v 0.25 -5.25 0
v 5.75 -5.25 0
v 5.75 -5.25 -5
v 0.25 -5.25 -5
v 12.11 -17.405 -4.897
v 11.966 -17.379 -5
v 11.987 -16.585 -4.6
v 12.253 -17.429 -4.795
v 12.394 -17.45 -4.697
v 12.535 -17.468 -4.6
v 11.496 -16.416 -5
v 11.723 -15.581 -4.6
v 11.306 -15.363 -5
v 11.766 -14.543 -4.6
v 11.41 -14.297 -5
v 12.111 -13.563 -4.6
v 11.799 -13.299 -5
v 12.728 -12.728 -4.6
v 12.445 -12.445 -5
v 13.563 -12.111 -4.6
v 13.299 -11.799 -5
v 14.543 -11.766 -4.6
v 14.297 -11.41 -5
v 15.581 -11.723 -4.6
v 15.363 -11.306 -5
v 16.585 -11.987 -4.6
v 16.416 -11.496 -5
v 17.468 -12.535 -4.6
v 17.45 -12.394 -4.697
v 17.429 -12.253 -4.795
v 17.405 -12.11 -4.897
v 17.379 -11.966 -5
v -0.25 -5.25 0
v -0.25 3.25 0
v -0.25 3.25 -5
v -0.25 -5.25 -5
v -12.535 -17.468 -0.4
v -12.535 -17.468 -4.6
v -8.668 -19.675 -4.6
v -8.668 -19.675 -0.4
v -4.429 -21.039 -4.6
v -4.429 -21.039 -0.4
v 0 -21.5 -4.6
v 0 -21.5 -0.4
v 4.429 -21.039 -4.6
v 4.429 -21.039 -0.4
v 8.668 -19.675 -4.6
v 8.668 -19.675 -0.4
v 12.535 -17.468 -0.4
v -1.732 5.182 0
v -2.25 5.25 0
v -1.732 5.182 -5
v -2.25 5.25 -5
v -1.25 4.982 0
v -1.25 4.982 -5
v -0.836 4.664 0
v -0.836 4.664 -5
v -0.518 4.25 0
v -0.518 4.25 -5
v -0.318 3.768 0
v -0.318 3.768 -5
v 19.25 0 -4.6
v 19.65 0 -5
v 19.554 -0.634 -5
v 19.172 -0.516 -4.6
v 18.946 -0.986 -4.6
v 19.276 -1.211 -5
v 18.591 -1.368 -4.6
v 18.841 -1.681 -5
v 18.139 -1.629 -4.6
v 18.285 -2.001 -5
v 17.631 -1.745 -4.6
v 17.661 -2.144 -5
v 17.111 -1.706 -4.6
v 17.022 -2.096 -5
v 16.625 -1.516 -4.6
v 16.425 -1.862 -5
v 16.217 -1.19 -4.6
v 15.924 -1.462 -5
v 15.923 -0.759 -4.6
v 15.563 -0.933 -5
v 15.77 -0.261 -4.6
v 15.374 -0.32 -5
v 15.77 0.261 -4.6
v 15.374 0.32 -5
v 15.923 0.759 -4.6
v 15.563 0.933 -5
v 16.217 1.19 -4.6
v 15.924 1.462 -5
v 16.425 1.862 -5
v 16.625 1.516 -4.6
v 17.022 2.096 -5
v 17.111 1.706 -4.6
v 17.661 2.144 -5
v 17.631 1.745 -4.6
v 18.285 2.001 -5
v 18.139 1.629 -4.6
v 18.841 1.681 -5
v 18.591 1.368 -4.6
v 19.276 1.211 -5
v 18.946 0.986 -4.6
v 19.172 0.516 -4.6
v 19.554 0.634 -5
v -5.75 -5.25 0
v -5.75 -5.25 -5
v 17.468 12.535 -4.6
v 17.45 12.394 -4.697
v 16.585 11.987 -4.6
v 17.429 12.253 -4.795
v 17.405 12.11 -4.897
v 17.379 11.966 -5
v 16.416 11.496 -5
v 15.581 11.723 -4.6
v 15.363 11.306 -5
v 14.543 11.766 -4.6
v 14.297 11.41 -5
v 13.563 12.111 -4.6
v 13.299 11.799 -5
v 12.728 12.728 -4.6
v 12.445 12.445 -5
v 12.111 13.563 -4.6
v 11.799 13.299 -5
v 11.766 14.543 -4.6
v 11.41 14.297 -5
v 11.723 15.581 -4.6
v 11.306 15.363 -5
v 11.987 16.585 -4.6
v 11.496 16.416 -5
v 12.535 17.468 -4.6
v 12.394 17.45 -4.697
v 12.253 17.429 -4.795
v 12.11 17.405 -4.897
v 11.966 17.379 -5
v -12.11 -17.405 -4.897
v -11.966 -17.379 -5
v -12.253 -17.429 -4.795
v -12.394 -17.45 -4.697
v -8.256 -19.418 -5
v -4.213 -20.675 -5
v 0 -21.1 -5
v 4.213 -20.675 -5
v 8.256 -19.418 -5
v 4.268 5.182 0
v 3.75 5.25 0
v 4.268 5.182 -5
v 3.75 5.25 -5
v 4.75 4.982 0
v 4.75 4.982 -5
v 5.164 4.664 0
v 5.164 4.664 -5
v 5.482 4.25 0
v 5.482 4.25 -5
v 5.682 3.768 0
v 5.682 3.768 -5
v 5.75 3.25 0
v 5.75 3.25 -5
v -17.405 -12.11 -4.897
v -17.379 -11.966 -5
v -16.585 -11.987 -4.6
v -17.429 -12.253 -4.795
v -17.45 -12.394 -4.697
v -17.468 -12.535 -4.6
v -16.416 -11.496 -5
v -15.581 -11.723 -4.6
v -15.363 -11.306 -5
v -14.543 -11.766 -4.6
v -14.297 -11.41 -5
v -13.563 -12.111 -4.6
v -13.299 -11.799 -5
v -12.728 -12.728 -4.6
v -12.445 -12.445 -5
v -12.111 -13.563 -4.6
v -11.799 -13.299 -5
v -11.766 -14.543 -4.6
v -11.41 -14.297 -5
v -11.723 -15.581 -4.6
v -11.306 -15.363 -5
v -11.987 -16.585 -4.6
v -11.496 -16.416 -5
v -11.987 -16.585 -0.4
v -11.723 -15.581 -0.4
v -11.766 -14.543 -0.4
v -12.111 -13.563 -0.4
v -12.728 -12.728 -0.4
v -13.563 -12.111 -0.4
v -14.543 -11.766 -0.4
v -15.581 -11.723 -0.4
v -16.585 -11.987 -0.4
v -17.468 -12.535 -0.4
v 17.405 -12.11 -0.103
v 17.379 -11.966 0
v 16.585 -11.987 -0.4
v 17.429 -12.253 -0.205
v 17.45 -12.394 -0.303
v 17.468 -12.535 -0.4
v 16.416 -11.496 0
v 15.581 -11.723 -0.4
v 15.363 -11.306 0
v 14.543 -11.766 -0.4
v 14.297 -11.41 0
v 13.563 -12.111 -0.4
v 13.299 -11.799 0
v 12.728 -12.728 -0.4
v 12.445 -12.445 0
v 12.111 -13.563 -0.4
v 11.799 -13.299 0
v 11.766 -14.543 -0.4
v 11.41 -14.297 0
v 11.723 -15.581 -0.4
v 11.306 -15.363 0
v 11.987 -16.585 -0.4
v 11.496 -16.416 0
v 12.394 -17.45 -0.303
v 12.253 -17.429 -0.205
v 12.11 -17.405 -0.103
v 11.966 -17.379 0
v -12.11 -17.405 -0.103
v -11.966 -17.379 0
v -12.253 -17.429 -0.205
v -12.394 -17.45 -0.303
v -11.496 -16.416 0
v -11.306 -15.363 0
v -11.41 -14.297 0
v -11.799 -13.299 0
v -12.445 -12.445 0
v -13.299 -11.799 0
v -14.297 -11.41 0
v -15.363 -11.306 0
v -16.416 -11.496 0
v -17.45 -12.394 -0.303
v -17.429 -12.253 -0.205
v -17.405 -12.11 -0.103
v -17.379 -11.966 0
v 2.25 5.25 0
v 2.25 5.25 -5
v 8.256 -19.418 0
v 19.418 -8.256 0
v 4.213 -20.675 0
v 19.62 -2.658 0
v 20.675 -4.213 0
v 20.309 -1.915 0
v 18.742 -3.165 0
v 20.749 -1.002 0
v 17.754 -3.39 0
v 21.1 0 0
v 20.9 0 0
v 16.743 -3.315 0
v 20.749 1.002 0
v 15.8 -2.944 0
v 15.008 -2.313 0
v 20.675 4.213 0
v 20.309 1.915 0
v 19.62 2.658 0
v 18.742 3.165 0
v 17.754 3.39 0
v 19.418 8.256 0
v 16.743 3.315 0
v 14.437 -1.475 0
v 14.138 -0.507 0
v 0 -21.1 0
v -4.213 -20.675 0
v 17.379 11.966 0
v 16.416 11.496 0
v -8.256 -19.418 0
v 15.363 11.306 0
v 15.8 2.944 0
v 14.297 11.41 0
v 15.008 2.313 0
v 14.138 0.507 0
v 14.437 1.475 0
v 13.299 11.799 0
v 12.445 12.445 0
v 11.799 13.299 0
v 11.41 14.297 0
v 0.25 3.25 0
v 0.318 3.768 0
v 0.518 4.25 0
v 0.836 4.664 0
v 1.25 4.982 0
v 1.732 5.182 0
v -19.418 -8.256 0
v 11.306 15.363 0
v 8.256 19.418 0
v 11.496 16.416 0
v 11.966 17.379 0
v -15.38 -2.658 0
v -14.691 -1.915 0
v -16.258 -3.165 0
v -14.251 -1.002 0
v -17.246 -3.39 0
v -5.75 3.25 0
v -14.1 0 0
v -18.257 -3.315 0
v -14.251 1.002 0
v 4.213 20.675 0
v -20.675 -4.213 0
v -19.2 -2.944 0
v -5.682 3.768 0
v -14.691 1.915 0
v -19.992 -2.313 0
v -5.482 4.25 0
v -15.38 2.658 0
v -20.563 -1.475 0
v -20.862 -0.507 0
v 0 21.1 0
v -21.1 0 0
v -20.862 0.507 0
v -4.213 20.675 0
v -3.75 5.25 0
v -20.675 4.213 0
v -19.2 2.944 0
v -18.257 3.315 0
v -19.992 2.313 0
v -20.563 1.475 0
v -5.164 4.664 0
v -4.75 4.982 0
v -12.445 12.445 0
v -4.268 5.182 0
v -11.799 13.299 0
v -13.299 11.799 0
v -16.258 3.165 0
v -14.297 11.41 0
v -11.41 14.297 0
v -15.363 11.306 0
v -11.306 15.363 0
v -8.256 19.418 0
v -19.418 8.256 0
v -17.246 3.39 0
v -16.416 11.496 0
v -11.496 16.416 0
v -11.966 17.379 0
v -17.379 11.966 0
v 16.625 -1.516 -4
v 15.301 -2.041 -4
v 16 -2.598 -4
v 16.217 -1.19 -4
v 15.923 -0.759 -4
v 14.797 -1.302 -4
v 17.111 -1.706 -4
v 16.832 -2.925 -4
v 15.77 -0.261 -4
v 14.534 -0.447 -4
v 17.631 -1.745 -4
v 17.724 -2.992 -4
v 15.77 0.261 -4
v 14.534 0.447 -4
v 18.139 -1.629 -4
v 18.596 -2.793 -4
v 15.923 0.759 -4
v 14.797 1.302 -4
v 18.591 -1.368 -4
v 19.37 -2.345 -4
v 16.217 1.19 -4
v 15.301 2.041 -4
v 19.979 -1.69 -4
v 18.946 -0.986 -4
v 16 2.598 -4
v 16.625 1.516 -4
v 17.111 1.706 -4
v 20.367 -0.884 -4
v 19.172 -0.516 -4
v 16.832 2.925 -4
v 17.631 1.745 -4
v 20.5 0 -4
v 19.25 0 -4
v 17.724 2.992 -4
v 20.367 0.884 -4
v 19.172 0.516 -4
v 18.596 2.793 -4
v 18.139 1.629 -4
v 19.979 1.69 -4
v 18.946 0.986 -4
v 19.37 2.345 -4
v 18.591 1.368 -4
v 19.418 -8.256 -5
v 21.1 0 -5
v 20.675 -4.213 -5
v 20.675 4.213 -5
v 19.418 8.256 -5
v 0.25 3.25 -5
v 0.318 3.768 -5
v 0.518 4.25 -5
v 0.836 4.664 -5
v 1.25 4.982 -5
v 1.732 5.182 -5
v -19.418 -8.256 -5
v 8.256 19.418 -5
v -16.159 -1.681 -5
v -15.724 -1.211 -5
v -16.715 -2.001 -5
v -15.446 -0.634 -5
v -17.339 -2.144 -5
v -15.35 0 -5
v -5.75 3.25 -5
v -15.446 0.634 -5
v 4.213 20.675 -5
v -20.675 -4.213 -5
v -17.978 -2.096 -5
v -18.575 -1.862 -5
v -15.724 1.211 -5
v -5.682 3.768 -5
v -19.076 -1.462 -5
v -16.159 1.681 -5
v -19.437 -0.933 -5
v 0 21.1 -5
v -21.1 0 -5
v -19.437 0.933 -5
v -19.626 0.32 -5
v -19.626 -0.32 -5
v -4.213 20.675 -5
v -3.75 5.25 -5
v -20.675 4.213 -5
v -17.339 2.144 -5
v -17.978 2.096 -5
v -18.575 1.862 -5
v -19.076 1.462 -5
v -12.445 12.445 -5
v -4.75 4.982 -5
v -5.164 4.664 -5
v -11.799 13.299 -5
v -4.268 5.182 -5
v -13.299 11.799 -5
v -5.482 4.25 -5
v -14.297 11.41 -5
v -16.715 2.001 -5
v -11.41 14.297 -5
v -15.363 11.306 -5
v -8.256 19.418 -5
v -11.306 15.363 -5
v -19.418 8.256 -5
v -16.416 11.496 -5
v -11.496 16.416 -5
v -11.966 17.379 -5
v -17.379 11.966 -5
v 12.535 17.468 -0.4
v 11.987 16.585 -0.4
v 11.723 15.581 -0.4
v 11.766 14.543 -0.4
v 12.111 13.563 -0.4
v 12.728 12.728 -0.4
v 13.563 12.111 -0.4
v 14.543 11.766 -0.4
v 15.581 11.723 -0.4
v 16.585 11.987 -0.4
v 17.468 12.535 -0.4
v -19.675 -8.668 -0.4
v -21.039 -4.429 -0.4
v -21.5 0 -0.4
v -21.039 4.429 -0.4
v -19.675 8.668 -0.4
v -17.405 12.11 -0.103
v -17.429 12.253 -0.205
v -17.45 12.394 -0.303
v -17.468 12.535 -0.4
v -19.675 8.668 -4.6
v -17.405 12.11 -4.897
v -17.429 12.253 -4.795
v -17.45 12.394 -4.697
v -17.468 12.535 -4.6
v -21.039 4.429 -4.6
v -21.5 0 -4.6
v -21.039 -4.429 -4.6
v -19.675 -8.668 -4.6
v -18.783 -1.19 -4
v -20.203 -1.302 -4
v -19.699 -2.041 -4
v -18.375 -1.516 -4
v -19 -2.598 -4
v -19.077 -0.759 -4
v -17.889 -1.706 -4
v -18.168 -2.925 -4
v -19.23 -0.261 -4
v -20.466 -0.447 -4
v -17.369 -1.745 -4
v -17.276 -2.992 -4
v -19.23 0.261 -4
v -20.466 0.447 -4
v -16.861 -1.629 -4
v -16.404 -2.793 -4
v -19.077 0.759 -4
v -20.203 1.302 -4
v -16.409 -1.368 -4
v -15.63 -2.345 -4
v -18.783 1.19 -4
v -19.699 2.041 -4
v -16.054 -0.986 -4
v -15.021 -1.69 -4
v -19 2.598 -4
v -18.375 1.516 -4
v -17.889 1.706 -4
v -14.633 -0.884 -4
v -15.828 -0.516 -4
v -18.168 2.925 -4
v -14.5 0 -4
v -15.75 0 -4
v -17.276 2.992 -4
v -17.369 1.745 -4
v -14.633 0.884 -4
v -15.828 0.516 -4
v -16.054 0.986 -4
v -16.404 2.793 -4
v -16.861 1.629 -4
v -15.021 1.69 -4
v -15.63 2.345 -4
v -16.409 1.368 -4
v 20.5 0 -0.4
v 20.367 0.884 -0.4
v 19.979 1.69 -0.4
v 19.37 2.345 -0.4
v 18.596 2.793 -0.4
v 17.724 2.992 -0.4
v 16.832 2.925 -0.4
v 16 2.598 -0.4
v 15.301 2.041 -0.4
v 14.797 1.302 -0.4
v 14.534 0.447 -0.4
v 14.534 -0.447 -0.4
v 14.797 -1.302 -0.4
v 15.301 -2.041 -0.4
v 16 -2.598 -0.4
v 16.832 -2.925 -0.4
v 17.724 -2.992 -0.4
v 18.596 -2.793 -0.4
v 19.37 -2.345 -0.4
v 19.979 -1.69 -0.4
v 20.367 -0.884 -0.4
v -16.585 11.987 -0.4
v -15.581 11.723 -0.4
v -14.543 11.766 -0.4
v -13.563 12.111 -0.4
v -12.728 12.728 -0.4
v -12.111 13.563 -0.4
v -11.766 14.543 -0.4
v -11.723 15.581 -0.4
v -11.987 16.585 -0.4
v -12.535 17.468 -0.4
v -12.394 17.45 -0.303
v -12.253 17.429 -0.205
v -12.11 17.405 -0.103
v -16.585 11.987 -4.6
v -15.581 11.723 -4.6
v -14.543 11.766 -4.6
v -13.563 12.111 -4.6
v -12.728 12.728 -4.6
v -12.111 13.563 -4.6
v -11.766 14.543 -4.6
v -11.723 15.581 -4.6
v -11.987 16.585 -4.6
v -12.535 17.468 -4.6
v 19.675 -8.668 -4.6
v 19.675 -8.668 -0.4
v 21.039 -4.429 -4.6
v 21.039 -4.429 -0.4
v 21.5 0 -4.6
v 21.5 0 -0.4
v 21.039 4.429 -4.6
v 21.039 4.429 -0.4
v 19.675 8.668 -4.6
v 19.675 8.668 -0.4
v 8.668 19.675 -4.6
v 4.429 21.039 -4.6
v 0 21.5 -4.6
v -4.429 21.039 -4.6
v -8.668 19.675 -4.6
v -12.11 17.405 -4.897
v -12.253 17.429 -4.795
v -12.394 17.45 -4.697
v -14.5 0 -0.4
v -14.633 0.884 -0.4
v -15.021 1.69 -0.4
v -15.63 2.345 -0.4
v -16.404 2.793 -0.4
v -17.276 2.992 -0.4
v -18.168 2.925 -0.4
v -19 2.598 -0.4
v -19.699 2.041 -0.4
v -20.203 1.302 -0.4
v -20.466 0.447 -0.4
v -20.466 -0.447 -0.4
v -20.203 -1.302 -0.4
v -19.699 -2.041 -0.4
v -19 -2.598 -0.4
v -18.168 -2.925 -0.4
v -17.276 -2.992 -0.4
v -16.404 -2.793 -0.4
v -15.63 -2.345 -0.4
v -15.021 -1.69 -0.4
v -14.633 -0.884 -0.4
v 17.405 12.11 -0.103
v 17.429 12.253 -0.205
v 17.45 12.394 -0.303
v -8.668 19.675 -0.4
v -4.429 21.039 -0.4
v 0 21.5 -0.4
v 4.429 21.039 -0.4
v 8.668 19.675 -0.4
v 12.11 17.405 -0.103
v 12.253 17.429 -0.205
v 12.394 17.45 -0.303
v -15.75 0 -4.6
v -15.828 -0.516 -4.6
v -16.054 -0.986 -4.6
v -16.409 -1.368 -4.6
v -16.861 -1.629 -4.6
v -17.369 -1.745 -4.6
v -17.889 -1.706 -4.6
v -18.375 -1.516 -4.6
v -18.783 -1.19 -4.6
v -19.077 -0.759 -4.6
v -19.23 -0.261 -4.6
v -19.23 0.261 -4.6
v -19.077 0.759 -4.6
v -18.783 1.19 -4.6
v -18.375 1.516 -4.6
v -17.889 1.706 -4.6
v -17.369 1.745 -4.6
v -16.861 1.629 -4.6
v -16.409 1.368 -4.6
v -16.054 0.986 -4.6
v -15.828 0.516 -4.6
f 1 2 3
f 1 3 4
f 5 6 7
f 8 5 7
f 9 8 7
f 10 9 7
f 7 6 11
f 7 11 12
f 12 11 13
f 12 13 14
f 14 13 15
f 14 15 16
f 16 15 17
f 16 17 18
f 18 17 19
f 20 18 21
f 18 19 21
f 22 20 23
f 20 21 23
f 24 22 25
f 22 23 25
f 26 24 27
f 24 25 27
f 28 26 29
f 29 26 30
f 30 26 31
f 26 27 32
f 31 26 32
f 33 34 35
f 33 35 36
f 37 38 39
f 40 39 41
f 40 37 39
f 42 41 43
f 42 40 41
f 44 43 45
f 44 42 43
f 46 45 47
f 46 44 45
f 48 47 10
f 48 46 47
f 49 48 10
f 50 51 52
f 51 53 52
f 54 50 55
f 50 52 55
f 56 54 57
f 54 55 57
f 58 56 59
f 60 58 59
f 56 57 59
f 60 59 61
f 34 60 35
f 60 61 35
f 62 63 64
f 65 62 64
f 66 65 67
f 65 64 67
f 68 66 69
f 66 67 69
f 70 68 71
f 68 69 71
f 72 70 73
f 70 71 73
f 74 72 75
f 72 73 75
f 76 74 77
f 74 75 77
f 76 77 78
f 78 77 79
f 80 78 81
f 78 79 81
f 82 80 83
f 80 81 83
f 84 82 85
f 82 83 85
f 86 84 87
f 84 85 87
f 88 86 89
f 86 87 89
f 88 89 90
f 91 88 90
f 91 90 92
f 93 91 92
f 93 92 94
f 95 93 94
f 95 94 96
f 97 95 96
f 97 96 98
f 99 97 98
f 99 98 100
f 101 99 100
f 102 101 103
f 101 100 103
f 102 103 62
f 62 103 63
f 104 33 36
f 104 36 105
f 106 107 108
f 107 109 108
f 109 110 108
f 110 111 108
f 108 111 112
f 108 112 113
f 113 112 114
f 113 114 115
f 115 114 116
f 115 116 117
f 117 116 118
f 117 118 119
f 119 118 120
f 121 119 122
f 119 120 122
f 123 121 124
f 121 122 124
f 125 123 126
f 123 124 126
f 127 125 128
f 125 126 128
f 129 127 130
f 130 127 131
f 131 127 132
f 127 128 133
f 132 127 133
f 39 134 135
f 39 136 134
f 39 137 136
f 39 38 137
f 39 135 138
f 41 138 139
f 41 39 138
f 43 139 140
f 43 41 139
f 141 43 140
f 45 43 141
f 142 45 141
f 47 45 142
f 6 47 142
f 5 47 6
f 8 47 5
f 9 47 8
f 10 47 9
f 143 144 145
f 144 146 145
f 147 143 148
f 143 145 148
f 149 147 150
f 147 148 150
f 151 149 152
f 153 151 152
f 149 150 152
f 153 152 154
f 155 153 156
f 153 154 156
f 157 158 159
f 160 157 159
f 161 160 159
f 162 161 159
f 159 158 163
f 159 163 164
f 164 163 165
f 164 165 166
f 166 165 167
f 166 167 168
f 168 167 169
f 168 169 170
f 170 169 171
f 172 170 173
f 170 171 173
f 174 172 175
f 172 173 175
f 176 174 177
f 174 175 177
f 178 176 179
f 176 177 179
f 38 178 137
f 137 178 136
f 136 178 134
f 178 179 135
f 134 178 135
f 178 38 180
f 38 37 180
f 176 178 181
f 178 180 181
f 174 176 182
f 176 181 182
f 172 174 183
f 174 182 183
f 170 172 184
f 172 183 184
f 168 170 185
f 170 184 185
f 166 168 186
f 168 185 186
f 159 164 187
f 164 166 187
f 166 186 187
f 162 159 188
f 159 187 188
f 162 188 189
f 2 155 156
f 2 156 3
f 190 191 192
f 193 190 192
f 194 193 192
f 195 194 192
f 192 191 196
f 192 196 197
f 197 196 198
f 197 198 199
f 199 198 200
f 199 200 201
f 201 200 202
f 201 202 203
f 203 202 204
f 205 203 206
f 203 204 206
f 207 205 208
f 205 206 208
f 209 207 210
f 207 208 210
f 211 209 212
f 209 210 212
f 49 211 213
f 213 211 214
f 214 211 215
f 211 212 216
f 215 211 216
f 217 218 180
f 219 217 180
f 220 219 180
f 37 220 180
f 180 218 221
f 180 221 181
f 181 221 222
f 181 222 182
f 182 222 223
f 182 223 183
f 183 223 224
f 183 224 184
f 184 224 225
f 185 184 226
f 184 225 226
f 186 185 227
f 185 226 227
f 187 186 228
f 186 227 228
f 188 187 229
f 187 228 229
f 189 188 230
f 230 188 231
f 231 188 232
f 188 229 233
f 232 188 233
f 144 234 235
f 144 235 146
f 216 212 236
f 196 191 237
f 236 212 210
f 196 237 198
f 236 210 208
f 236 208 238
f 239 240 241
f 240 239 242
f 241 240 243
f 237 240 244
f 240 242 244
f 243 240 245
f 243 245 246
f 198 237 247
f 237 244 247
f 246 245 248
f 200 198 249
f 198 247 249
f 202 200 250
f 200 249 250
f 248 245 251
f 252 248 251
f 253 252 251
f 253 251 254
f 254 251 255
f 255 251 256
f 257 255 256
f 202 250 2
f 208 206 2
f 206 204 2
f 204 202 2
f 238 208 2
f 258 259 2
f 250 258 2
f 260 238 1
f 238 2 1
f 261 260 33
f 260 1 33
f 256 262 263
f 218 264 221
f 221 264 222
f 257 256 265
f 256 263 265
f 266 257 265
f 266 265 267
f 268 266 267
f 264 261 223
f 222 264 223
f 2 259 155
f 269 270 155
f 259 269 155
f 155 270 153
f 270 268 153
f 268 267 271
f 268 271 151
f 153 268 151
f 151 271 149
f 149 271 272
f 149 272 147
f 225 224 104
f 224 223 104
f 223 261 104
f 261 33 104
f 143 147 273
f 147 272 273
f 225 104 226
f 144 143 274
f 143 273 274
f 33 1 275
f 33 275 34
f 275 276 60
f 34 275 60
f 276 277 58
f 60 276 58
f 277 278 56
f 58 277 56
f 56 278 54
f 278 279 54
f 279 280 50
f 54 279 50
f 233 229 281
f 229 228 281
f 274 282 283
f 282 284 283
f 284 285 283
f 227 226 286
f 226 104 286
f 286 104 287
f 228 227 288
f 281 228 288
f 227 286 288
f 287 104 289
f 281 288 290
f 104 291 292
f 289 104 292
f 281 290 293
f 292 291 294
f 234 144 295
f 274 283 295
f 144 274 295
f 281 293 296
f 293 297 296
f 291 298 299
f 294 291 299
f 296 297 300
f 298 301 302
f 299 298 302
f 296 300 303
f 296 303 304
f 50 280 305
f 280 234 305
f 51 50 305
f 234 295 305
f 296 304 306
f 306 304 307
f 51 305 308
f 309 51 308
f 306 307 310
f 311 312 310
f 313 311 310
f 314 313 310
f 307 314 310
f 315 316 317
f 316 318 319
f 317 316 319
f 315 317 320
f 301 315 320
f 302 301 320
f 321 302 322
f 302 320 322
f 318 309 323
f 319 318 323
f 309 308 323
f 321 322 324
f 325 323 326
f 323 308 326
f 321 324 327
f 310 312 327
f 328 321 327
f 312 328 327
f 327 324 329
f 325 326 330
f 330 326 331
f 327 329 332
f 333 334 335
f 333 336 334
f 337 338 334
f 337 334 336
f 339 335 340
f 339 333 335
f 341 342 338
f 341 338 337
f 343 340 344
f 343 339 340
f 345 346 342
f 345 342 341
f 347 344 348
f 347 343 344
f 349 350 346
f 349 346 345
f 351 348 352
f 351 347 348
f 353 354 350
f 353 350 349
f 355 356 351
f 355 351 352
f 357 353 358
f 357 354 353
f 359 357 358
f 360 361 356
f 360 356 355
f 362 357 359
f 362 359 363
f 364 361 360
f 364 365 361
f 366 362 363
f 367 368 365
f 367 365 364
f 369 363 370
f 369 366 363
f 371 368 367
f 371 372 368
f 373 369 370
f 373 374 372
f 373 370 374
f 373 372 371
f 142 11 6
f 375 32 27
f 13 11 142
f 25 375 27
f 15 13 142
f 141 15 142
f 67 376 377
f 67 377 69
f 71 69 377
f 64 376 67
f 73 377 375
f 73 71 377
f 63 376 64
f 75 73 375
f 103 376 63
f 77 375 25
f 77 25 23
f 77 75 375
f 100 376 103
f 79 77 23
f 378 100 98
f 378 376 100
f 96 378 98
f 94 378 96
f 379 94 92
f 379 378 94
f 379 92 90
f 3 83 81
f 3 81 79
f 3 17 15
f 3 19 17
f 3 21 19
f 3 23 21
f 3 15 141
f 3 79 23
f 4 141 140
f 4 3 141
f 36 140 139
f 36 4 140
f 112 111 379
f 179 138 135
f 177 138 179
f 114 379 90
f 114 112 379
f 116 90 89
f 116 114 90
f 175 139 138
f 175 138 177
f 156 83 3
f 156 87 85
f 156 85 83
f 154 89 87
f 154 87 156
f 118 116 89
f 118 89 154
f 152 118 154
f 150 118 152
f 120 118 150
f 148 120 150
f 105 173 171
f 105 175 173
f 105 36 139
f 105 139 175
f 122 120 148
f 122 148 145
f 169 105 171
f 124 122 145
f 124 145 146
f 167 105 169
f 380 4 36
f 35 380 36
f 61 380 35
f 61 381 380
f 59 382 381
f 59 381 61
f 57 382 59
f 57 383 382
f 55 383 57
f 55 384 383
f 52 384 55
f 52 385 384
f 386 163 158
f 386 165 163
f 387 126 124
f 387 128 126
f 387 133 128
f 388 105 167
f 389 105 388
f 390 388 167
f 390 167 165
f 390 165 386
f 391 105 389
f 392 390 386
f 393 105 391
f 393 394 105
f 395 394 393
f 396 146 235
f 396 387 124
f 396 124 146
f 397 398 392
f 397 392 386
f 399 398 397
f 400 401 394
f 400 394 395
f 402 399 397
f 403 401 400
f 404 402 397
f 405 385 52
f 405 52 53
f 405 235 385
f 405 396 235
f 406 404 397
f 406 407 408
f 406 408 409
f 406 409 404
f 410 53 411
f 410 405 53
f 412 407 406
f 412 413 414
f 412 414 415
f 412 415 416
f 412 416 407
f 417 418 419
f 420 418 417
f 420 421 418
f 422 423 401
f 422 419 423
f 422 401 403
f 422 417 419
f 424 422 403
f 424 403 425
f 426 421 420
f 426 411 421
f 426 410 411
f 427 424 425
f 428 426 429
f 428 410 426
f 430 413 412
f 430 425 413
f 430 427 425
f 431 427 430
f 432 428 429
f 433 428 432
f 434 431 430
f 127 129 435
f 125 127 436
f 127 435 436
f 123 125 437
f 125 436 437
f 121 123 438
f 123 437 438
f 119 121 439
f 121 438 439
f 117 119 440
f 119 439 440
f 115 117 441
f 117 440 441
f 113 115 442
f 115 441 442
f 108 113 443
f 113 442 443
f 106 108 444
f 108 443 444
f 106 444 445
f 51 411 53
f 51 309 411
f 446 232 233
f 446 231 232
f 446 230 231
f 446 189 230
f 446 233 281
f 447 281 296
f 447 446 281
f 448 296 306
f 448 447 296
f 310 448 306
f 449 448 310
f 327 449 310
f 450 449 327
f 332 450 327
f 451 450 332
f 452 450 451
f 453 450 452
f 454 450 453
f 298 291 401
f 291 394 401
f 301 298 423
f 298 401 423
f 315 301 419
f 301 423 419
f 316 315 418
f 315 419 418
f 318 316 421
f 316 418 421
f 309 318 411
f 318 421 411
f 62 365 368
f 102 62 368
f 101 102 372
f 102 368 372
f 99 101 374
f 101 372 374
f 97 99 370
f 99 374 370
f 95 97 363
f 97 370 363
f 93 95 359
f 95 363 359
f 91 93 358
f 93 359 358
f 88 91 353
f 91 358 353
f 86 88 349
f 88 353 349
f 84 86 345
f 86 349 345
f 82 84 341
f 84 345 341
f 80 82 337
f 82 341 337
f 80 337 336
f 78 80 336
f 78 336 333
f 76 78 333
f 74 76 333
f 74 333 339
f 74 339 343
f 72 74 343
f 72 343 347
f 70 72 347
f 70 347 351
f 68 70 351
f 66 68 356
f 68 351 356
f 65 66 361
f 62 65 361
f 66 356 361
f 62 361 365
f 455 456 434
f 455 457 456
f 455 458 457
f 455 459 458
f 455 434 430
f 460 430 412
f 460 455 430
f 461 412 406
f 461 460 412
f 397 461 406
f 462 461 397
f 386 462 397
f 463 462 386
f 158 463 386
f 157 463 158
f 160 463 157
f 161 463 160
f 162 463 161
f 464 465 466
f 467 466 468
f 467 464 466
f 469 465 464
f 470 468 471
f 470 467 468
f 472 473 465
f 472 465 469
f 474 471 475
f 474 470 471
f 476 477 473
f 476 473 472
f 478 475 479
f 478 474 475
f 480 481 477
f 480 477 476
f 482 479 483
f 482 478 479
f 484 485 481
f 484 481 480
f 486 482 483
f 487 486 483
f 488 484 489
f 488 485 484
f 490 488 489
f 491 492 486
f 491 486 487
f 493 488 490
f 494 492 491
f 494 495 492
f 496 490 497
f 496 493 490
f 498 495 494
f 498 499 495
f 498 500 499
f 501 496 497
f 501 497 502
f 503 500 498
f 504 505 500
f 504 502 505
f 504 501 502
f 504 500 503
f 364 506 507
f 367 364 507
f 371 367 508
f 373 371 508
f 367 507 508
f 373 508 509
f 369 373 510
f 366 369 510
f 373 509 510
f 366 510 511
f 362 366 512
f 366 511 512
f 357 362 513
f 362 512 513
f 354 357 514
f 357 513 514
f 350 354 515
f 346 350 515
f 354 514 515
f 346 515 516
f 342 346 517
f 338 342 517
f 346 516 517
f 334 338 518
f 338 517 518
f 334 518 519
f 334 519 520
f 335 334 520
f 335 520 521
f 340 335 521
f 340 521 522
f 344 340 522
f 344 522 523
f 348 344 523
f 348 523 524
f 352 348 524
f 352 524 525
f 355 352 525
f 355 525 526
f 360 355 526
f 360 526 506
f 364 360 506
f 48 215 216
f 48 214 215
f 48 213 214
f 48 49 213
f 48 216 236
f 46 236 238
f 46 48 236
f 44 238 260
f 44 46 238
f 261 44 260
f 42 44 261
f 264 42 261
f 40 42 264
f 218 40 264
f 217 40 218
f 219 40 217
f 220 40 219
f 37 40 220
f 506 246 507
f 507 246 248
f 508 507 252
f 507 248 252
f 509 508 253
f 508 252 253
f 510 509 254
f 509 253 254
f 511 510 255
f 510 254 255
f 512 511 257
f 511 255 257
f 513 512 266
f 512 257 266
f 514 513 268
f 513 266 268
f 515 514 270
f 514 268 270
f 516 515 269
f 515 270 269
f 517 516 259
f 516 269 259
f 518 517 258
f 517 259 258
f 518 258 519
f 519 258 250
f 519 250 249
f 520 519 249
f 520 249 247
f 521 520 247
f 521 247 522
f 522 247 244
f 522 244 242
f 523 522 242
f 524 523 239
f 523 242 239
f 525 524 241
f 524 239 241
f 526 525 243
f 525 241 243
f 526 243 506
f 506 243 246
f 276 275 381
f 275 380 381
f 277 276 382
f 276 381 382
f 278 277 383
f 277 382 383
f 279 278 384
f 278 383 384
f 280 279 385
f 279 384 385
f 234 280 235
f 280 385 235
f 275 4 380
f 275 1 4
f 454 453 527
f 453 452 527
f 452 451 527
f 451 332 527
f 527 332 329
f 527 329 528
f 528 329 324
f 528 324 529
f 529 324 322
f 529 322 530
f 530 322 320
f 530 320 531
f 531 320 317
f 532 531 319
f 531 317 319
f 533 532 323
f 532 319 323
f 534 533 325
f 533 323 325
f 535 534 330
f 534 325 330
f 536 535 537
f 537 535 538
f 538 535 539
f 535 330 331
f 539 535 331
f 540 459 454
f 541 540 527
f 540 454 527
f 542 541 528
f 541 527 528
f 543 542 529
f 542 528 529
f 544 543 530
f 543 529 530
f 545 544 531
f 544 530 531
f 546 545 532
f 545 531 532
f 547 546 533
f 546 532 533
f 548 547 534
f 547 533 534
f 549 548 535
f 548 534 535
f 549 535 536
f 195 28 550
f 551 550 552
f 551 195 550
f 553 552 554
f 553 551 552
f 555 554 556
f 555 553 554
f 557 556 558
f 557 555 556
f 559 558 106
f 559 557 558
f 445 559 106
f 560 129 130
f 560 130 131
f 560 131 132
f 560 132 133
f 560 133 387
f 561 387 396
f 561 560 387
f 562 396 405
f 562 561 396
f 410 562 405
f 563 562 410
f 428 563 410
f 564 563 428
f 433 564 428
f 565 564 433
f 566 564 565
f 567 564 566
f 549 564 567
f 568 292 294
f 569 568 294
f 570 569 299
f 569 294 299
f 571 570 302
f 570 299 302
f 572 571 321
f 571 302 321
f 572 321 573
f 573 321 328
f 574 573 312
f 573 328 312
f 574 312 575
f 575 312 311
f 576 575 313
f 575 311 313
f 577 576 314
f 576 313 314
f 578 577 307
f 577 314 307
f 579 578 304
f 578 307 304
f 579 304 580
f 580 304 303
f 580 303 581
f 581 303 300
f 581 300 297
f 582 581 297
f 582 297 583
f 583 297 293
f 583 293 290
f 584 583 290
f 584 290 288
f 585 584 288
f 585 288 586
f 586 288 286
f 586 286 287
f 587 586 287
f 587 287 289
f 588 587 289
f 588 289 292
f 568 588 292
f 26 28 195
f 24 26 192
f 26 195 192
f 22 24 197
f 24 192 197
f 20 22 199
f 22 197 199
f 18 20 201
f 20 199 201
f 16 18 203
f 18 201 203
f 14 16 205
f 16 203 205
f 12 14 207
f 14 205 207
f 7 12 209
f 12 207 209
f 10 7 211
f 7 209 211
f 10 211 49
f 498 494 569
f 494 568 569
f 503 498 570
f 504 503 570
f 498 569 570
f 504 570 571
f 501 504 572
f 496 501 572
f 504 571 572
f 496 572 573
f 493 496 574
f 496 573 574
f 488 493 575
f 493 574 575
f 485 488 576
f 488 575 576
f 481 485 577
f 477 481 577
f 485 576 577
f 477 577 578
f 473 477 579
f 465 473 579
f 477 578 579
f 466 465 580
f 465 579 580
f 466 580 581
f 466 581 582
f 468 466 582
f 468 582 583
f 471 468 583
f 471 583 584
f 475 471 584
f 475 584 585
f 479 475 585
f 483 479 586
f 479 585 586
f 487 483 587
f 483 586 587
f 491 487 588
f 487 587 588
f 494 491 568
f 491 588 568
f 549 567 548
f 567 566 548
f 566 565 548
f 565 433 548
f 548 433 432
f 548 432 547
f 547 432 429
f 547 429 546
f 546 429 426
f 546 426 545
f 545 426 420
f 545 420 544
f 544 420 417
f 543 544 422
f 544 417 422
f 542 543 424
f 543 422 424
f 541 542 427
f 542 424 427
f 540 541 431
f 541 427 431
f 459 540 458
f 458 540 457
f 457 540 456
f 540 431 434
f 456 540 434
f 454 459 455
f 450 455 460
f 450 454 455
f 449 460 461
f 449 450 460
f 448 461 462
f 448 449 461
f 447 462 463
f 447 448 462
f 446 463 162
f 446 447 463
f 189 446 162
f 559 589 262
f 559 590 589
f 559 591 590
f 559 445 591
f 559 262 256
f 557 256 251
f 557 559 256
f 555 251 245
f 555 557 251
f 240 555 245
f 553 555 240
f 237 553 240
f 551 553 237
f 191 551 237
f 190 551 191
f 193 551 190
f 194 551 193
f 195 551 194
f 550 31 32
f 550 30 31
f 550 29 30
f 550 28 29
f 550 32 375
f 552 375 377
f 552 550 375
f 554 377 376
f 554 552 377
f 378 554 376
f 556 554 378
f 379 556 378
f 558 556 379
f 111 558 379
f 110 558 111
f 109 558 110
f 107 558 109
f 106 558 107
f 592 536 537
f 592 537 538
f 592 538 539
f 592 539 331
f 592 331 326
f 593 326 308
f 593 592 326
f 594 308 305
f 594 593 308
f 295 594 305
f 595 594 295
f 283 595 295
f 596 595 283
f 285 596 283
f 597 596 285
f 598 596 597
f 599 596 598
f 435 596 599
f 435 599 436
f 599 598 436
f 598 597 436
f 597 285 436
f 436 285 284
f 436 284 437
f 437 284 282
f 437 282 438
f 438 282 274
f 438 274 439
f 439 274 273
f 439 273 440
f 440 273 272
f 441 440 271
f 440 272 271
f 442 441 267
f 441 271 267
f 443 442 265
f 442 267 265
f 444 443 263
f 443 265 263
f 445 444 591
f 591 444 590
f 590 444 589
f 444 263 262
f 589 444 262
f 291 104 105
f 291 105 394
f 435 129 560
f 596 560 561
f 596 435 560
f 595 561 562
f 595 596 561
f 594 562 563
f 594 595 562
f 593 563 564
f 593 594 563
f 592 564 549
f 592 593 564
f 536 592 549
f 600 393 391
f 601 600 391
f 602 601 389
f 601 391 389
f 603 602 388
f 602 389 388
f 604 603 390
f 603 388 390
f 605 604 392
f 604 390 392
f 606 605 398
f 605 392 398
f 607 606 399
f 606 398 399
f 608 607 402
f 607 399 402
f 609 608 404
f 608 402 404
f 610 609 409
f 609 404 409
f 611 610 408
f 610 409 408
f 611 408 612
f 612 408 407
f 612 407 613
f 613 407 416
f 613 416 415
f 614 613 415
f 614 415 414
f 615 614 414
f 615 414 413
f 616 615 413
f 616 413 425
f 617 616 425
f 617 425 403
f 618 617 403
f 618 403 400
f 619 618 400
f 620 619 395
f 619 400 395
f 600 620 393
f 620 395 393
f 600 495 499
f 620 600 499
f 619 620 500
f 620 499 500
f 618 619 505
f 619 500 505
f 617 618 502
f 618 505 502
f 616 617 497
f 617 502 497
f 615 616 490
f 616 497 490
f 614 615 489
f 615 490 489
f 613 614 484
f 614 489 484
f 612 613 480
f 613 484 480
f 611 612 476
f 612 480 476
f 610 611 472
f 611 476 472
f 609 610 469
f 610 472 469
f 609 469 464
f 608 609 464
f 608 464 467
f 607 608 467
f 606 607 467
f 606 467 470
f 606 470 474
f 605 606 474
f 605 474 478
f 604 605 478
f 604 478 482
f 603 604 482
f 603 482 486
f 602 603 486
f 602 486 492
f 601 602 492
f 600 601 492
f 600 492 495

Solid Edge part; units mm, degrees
sketch "Sketch1" plane through (0, 0, 0) normal (0, 0, 1) x (1, 0, 0)
  arc A0 (-12.5347, 17.468) -> (12.5347, 17.468) centre (0, 0) cw
  arc A1 (17.468, 12.5347) -> (17.468, -12.5347) centre (0, 0) cw
  arc A2 (12.5347, -17.468) -> (-12.5347, -17.468) centre (0, 0) cw
  arc A3 (-17.468, -12.5347) -> (-17.468, 12.5347) centre (0, 0) cw
  arc A4 (-12.5347, 17.468) -> (-17.468, 12.5347) centre (-15.2028, 15.2028) cw
  arc A5 (17.468, 12.5347) -> (12.5347, 17.468) centre (15.2028, 15.2028) cw
  arc A6 (12.5347, -17.468) -> (17.468, -12.5347) centre (15.2028, -15.2028) cw
  arc A7 (-17.468, -12.5347) -> (-12.5347, -17.468) centre (-15.2028, -15.2028) cw
extrude "Protrusion1" add sketch "Sketch1" against normal blind 5
sketch "Sketch2" plane through (0, 0, 0) normal (0, 0, 1) x (1, 0, 0)
  circle A0 centre (-17.5, 0) radius 1.75
  circle A1 centre (17.5, 0) radius 1.75
  dimension "D1" = 35
extrude "Cutout1" cut sketch "Sketch2" against normal through all
sketch "Sketch3" plane through (0, 0, 0) normal (0, 0, 1) x (1, 0, 0)
  circle A0 centre (-17.5, 0) radius 3
  circle A1 centre (17.5, 0) radius 3
  dimension "D1" = 35
extrude "VaciadoExtruido_2" cut sketch "Sketch3" against normal blind 4
chamfer "Chaflán_1" distance 0.4 angle 45 20 edges at (-20.5, 0, 0) (14.5, 0, 0) (-12.7279, -12.7279, 0) (0, -21.5, 0) (12.7279, -12.7279, 0) (21.5, 0, 0) (12.7279, 12.7279, 0) (0, 21.5, 0) (-12.7279, 12.7279, 0) (-21.5, 0, 0) (15.75, 0, -5) (-19.25, 0, -5) (-12.7279, -12.7279, -5) (-21.5, 0, -5) (-12.7279, 12.7279, -5) (0, 21.5, -5) (12.7279, 12.7279, -5) (21.5, 0, -5) (12.7279, -12.7279, -5) (0, -21.5, -5)
sketch "Sketch4" plane through (0, 0, 0) normal (0, 0, 1) x (0, 1, 0)
  line L0 (-5.25, 5.75) -> (5.25, 5.75)
  line L1 (5.25, 5.75) -> (5.25, 0.25)
  line L2 (5.25, 0.25) -> (-5.25, 0.25)
  line L3 (-5.25, 0.25) -> (-5.25, 5.75)
  line L4 (-5.25, -5.75) -> (-5.25, -0.25)
  line L5 (-5.25, -0.25) -> (5.25, -0.25)
  line L6 (5.25, -0.25) -> (5.25, -5.75)
  line L7 (5.25, -5.75) -> (-5.25, -5.75)
  dimension "D1" = 5.5
  dimension "D2" = 10.5
  dimension "D3" = 6
extrude "Cutout2" cut sketch "Sketch4" against normal through all
fillet "Redondeo_1" radius 2 4 edges at (-5.75, 5.25, -2.5) (-0.25, 5.25, -2.5) (0.25, 5.25, -2.5) (5.75, 5.25, -2.5)
